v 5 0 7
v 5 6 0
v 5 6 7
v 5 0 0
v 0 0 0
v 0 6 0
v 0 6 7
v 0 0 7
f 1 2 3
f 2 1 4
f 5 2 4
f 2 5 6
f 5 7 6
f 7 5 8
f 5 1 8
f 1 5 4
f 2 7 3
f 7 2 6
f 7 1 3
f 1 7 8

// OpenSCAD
translate([2.5, 1.0, 1.5]) color([0.7896231589257826, 0.7184994227715396, 0.3382559700266786]) cube([5, 2, 3], center=true);
translate([2.5, 3.0, 1.5]) color([0.6205381083165517, 0.041202949506209285, 0.16386054567557595]) cube([5, 2, 3], center=true);
translate([2.5, 5.0, 1.5]) color([0.9819140701253054, 0.28953085363586695, 0.39479198298829066]) cube([5, 2, 3], center=true);
translate([2.5, 1.5, 4.0]) color([0.5484842965725134, 0.29340700145733656, 0.47806466915102097]) cube([5, 3, 2], center=true);
translate([2.5, 4.5, 4.0]) color([0.2397060836386239, 0.04825636228829444, 0.17958684904155564]) cube([5, 3, 2], center=true);
translate([2.5, 1.5, 6.0]) color([0.5230502317000981, 0.07086288409434749, 0.4031691464450935]) cube([5, 3, 2], center=true);
translate([2.5, 4.5, 6.0]) color([0.3285207100154869, 0.4147216089714424, 0.09940033823870109]) cube([5, 3, 2], center=true);
